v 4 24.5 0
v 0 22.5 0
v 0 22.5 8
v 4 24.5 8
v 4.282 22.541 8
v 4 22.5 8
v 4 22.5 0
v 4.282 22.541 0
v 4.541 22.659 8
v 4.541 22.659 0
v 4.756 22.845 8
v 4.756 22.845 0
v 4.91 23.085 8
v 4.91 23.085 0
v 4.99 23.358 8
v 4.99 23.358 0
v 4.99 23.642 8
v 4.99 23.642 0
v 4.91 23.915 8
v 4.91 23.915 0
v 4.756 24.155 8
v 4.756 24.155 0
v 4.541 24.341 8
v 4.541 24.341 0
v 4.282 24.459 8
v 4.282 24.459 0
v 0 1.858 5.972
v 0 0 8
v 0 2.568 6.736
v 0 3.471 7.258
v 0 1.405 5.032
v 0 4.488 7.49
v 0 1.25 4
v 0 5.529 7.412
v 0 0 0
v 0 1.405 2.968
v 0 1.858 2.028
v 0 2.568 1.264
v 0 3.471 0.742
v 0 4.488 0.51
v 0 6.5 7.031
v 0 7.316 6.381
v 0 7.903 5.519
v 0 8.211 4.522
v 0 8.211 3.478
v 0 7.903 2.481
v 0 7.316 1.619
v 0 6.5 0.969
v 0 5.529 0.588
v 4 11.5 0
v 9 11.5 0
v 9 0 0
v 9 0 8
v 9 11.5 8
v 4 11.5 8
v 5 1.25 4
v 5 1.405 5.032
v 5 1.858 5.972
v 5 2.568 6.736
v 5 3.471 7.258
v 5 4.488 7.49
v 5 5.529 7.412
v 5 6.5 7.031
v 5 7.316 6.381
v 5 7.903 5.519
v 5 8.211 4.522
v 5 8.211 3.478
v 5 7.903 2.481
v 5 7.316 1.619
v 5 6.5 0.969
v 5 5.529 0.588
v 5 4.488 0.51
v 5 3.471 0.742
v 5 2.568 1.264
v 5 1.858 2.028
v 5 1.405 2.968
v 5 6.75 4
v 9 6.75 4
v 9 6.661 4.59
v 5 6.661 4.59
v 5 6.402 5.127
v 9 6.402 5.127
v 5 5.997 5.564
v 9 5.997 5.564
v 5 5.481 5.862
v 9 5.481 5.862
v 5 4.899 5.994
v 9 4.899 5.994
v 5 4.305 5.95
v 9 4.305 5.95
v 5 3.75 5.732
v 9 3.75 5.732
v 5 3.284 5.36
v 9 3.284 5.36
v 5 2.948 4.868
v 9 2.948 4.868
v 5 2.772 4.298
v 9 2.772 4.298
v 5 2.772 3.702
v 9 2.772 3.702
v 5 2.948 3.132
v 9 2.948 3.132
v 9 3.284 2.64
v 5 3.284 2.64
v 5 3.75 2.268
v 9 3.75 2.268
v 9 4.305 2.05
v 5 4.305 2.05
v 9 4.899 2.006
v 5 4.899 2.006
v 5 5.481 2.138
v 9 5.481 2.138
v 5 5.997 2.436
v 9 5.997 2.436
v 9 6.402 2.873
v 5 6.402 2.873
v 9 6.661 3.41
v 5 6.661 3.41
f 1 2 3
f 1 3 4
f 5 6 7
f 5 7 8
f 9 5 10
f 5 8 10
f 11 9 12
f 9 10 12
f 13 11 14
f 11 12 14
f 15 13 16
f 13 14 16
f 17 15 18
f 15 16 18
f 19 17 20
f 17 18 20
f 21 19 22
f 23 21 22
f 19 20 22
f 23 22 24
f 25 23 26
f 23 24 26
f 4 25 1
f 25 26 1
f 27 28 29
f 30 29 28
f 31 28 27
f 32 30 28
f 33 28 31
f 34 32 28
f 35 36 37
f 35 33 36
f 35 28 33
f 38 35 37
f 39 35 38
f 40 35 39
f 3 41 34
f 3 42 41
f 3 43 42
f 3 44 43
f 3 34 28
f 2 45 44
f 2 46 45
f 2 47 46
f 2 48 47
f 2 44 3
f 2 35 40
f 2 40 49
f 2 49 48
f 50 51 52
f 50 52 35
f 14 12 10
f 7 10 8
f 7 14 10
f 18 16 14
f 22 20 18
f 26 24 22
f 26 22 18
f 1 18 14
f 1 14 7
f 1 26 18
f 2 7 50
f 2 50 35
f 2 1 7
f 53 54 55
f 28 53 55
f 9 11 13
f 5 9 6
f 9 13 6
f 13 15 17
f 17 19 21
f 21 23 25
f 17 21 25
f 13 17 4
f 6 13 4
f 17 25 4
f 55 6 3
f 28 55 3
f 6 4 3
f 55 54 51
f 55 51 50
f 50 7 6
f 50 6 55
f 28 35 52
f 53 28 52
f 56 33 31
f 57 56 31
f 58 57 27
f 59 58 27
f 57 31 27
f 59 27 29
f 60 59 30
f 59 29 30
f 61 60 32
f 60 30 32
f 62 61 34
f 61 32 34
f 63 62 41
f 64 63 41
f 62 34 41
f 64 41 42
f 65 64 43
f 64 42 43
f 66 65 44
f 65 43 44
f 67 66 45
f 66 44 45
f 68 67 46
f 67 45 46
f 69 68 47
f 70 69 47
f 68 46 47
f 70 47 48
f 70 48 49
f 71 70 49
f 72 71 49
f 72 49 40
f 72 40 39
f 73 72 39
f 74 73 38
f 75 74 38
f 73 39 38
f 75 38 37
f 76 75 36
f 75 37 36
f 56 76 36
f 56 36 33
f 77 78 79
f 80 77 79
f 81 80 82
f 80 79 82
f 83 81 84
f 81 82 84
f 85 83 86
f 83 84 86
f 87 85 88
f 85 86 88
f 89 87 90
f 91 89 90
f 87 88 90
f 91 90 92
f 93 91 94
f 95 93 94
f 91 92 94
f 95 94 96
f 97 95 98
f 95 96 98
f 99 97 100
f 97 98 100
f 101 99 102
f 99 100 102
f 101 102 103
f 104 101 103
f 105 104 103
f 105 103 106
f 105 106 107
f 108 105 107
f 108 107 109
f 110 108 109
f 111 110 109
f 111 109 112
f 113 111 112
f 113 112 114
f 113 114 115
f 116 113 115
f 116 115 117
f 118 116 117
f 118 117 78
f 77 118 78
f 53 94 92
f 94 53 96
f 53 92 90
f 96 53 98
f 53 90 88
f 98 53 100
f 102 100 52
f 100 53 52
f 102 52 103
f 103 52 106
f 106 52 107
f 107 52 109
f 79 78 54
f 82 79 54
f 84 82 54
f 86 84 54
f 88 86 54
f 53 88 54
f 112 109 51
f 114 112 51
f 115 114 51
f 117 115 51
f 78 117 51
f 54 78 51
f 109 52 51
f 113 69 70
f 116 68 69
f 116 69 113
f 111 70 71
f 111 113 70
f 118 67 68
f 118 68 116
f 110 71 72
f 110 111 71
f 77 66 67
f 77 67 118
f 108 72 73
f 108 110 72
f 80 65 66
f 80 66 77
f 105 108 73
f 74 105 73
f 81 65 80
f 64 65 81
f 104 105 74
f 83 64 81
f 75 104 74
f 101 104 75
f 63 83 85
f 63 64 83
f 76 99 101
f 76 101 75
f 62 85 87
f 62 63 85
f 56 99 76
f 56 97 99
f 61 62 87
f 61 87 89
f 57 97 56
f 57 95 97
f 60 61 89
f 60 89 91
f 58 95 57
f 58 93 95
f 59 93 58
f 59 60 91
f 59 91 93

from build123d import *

# Parameters (mm, degrees)
PAD_DEPTH       = 8
SKETCH001_R     = 2
POCKET_DEPTH    = 9
SKETCH002_R     = 3.5
POCKET001_DEPTH = 5


with BuildPart() as part:
    # Sketch → Pad (new body)
    with BuildSketch(Plane.XY):
        with BuildLine():
            Line((0, 0), (0, 22.5))
            Line((0, 22.5), (4, 24.5))
            ThreePointArc((4, 22.5), (5, 23.5), (4, 24.5))
            Line((4, 22.5), (4, 11.5))
            Line((9, 11.5), (4, 11.5))
            Line((9, 0), (9, 11.5))
            Line((0, 0), (9, 0))
        make_face()
    extrude(amount=PAD_DEPTH)

    # Sketch001 (on Face6 of Pad) → Pocket (cut)
    with BuildSketch(Plane.YZ.offset(9)):
        with Locations((4.75, 4)):
            Circle(SKETCH001_R)
    extrude(amount=-POCKET_DEPTH, mode=Mode.SUBTRACT)

    # Sketch002 (on Face1 of Pocket) → Pocket001 (cut)
    with BuildSketch(Plane(origin=(0, 0, 0), x_dir=(0, -1, 0), z_dir=(-1, 0, 0))):
        with Locations((-4.75, 4)):
            Circle(SKETCH002_R)
    extrude(amount=-POCKET001_DEPTH, mode=Mode.SUBTRACT)


solid = part.part
